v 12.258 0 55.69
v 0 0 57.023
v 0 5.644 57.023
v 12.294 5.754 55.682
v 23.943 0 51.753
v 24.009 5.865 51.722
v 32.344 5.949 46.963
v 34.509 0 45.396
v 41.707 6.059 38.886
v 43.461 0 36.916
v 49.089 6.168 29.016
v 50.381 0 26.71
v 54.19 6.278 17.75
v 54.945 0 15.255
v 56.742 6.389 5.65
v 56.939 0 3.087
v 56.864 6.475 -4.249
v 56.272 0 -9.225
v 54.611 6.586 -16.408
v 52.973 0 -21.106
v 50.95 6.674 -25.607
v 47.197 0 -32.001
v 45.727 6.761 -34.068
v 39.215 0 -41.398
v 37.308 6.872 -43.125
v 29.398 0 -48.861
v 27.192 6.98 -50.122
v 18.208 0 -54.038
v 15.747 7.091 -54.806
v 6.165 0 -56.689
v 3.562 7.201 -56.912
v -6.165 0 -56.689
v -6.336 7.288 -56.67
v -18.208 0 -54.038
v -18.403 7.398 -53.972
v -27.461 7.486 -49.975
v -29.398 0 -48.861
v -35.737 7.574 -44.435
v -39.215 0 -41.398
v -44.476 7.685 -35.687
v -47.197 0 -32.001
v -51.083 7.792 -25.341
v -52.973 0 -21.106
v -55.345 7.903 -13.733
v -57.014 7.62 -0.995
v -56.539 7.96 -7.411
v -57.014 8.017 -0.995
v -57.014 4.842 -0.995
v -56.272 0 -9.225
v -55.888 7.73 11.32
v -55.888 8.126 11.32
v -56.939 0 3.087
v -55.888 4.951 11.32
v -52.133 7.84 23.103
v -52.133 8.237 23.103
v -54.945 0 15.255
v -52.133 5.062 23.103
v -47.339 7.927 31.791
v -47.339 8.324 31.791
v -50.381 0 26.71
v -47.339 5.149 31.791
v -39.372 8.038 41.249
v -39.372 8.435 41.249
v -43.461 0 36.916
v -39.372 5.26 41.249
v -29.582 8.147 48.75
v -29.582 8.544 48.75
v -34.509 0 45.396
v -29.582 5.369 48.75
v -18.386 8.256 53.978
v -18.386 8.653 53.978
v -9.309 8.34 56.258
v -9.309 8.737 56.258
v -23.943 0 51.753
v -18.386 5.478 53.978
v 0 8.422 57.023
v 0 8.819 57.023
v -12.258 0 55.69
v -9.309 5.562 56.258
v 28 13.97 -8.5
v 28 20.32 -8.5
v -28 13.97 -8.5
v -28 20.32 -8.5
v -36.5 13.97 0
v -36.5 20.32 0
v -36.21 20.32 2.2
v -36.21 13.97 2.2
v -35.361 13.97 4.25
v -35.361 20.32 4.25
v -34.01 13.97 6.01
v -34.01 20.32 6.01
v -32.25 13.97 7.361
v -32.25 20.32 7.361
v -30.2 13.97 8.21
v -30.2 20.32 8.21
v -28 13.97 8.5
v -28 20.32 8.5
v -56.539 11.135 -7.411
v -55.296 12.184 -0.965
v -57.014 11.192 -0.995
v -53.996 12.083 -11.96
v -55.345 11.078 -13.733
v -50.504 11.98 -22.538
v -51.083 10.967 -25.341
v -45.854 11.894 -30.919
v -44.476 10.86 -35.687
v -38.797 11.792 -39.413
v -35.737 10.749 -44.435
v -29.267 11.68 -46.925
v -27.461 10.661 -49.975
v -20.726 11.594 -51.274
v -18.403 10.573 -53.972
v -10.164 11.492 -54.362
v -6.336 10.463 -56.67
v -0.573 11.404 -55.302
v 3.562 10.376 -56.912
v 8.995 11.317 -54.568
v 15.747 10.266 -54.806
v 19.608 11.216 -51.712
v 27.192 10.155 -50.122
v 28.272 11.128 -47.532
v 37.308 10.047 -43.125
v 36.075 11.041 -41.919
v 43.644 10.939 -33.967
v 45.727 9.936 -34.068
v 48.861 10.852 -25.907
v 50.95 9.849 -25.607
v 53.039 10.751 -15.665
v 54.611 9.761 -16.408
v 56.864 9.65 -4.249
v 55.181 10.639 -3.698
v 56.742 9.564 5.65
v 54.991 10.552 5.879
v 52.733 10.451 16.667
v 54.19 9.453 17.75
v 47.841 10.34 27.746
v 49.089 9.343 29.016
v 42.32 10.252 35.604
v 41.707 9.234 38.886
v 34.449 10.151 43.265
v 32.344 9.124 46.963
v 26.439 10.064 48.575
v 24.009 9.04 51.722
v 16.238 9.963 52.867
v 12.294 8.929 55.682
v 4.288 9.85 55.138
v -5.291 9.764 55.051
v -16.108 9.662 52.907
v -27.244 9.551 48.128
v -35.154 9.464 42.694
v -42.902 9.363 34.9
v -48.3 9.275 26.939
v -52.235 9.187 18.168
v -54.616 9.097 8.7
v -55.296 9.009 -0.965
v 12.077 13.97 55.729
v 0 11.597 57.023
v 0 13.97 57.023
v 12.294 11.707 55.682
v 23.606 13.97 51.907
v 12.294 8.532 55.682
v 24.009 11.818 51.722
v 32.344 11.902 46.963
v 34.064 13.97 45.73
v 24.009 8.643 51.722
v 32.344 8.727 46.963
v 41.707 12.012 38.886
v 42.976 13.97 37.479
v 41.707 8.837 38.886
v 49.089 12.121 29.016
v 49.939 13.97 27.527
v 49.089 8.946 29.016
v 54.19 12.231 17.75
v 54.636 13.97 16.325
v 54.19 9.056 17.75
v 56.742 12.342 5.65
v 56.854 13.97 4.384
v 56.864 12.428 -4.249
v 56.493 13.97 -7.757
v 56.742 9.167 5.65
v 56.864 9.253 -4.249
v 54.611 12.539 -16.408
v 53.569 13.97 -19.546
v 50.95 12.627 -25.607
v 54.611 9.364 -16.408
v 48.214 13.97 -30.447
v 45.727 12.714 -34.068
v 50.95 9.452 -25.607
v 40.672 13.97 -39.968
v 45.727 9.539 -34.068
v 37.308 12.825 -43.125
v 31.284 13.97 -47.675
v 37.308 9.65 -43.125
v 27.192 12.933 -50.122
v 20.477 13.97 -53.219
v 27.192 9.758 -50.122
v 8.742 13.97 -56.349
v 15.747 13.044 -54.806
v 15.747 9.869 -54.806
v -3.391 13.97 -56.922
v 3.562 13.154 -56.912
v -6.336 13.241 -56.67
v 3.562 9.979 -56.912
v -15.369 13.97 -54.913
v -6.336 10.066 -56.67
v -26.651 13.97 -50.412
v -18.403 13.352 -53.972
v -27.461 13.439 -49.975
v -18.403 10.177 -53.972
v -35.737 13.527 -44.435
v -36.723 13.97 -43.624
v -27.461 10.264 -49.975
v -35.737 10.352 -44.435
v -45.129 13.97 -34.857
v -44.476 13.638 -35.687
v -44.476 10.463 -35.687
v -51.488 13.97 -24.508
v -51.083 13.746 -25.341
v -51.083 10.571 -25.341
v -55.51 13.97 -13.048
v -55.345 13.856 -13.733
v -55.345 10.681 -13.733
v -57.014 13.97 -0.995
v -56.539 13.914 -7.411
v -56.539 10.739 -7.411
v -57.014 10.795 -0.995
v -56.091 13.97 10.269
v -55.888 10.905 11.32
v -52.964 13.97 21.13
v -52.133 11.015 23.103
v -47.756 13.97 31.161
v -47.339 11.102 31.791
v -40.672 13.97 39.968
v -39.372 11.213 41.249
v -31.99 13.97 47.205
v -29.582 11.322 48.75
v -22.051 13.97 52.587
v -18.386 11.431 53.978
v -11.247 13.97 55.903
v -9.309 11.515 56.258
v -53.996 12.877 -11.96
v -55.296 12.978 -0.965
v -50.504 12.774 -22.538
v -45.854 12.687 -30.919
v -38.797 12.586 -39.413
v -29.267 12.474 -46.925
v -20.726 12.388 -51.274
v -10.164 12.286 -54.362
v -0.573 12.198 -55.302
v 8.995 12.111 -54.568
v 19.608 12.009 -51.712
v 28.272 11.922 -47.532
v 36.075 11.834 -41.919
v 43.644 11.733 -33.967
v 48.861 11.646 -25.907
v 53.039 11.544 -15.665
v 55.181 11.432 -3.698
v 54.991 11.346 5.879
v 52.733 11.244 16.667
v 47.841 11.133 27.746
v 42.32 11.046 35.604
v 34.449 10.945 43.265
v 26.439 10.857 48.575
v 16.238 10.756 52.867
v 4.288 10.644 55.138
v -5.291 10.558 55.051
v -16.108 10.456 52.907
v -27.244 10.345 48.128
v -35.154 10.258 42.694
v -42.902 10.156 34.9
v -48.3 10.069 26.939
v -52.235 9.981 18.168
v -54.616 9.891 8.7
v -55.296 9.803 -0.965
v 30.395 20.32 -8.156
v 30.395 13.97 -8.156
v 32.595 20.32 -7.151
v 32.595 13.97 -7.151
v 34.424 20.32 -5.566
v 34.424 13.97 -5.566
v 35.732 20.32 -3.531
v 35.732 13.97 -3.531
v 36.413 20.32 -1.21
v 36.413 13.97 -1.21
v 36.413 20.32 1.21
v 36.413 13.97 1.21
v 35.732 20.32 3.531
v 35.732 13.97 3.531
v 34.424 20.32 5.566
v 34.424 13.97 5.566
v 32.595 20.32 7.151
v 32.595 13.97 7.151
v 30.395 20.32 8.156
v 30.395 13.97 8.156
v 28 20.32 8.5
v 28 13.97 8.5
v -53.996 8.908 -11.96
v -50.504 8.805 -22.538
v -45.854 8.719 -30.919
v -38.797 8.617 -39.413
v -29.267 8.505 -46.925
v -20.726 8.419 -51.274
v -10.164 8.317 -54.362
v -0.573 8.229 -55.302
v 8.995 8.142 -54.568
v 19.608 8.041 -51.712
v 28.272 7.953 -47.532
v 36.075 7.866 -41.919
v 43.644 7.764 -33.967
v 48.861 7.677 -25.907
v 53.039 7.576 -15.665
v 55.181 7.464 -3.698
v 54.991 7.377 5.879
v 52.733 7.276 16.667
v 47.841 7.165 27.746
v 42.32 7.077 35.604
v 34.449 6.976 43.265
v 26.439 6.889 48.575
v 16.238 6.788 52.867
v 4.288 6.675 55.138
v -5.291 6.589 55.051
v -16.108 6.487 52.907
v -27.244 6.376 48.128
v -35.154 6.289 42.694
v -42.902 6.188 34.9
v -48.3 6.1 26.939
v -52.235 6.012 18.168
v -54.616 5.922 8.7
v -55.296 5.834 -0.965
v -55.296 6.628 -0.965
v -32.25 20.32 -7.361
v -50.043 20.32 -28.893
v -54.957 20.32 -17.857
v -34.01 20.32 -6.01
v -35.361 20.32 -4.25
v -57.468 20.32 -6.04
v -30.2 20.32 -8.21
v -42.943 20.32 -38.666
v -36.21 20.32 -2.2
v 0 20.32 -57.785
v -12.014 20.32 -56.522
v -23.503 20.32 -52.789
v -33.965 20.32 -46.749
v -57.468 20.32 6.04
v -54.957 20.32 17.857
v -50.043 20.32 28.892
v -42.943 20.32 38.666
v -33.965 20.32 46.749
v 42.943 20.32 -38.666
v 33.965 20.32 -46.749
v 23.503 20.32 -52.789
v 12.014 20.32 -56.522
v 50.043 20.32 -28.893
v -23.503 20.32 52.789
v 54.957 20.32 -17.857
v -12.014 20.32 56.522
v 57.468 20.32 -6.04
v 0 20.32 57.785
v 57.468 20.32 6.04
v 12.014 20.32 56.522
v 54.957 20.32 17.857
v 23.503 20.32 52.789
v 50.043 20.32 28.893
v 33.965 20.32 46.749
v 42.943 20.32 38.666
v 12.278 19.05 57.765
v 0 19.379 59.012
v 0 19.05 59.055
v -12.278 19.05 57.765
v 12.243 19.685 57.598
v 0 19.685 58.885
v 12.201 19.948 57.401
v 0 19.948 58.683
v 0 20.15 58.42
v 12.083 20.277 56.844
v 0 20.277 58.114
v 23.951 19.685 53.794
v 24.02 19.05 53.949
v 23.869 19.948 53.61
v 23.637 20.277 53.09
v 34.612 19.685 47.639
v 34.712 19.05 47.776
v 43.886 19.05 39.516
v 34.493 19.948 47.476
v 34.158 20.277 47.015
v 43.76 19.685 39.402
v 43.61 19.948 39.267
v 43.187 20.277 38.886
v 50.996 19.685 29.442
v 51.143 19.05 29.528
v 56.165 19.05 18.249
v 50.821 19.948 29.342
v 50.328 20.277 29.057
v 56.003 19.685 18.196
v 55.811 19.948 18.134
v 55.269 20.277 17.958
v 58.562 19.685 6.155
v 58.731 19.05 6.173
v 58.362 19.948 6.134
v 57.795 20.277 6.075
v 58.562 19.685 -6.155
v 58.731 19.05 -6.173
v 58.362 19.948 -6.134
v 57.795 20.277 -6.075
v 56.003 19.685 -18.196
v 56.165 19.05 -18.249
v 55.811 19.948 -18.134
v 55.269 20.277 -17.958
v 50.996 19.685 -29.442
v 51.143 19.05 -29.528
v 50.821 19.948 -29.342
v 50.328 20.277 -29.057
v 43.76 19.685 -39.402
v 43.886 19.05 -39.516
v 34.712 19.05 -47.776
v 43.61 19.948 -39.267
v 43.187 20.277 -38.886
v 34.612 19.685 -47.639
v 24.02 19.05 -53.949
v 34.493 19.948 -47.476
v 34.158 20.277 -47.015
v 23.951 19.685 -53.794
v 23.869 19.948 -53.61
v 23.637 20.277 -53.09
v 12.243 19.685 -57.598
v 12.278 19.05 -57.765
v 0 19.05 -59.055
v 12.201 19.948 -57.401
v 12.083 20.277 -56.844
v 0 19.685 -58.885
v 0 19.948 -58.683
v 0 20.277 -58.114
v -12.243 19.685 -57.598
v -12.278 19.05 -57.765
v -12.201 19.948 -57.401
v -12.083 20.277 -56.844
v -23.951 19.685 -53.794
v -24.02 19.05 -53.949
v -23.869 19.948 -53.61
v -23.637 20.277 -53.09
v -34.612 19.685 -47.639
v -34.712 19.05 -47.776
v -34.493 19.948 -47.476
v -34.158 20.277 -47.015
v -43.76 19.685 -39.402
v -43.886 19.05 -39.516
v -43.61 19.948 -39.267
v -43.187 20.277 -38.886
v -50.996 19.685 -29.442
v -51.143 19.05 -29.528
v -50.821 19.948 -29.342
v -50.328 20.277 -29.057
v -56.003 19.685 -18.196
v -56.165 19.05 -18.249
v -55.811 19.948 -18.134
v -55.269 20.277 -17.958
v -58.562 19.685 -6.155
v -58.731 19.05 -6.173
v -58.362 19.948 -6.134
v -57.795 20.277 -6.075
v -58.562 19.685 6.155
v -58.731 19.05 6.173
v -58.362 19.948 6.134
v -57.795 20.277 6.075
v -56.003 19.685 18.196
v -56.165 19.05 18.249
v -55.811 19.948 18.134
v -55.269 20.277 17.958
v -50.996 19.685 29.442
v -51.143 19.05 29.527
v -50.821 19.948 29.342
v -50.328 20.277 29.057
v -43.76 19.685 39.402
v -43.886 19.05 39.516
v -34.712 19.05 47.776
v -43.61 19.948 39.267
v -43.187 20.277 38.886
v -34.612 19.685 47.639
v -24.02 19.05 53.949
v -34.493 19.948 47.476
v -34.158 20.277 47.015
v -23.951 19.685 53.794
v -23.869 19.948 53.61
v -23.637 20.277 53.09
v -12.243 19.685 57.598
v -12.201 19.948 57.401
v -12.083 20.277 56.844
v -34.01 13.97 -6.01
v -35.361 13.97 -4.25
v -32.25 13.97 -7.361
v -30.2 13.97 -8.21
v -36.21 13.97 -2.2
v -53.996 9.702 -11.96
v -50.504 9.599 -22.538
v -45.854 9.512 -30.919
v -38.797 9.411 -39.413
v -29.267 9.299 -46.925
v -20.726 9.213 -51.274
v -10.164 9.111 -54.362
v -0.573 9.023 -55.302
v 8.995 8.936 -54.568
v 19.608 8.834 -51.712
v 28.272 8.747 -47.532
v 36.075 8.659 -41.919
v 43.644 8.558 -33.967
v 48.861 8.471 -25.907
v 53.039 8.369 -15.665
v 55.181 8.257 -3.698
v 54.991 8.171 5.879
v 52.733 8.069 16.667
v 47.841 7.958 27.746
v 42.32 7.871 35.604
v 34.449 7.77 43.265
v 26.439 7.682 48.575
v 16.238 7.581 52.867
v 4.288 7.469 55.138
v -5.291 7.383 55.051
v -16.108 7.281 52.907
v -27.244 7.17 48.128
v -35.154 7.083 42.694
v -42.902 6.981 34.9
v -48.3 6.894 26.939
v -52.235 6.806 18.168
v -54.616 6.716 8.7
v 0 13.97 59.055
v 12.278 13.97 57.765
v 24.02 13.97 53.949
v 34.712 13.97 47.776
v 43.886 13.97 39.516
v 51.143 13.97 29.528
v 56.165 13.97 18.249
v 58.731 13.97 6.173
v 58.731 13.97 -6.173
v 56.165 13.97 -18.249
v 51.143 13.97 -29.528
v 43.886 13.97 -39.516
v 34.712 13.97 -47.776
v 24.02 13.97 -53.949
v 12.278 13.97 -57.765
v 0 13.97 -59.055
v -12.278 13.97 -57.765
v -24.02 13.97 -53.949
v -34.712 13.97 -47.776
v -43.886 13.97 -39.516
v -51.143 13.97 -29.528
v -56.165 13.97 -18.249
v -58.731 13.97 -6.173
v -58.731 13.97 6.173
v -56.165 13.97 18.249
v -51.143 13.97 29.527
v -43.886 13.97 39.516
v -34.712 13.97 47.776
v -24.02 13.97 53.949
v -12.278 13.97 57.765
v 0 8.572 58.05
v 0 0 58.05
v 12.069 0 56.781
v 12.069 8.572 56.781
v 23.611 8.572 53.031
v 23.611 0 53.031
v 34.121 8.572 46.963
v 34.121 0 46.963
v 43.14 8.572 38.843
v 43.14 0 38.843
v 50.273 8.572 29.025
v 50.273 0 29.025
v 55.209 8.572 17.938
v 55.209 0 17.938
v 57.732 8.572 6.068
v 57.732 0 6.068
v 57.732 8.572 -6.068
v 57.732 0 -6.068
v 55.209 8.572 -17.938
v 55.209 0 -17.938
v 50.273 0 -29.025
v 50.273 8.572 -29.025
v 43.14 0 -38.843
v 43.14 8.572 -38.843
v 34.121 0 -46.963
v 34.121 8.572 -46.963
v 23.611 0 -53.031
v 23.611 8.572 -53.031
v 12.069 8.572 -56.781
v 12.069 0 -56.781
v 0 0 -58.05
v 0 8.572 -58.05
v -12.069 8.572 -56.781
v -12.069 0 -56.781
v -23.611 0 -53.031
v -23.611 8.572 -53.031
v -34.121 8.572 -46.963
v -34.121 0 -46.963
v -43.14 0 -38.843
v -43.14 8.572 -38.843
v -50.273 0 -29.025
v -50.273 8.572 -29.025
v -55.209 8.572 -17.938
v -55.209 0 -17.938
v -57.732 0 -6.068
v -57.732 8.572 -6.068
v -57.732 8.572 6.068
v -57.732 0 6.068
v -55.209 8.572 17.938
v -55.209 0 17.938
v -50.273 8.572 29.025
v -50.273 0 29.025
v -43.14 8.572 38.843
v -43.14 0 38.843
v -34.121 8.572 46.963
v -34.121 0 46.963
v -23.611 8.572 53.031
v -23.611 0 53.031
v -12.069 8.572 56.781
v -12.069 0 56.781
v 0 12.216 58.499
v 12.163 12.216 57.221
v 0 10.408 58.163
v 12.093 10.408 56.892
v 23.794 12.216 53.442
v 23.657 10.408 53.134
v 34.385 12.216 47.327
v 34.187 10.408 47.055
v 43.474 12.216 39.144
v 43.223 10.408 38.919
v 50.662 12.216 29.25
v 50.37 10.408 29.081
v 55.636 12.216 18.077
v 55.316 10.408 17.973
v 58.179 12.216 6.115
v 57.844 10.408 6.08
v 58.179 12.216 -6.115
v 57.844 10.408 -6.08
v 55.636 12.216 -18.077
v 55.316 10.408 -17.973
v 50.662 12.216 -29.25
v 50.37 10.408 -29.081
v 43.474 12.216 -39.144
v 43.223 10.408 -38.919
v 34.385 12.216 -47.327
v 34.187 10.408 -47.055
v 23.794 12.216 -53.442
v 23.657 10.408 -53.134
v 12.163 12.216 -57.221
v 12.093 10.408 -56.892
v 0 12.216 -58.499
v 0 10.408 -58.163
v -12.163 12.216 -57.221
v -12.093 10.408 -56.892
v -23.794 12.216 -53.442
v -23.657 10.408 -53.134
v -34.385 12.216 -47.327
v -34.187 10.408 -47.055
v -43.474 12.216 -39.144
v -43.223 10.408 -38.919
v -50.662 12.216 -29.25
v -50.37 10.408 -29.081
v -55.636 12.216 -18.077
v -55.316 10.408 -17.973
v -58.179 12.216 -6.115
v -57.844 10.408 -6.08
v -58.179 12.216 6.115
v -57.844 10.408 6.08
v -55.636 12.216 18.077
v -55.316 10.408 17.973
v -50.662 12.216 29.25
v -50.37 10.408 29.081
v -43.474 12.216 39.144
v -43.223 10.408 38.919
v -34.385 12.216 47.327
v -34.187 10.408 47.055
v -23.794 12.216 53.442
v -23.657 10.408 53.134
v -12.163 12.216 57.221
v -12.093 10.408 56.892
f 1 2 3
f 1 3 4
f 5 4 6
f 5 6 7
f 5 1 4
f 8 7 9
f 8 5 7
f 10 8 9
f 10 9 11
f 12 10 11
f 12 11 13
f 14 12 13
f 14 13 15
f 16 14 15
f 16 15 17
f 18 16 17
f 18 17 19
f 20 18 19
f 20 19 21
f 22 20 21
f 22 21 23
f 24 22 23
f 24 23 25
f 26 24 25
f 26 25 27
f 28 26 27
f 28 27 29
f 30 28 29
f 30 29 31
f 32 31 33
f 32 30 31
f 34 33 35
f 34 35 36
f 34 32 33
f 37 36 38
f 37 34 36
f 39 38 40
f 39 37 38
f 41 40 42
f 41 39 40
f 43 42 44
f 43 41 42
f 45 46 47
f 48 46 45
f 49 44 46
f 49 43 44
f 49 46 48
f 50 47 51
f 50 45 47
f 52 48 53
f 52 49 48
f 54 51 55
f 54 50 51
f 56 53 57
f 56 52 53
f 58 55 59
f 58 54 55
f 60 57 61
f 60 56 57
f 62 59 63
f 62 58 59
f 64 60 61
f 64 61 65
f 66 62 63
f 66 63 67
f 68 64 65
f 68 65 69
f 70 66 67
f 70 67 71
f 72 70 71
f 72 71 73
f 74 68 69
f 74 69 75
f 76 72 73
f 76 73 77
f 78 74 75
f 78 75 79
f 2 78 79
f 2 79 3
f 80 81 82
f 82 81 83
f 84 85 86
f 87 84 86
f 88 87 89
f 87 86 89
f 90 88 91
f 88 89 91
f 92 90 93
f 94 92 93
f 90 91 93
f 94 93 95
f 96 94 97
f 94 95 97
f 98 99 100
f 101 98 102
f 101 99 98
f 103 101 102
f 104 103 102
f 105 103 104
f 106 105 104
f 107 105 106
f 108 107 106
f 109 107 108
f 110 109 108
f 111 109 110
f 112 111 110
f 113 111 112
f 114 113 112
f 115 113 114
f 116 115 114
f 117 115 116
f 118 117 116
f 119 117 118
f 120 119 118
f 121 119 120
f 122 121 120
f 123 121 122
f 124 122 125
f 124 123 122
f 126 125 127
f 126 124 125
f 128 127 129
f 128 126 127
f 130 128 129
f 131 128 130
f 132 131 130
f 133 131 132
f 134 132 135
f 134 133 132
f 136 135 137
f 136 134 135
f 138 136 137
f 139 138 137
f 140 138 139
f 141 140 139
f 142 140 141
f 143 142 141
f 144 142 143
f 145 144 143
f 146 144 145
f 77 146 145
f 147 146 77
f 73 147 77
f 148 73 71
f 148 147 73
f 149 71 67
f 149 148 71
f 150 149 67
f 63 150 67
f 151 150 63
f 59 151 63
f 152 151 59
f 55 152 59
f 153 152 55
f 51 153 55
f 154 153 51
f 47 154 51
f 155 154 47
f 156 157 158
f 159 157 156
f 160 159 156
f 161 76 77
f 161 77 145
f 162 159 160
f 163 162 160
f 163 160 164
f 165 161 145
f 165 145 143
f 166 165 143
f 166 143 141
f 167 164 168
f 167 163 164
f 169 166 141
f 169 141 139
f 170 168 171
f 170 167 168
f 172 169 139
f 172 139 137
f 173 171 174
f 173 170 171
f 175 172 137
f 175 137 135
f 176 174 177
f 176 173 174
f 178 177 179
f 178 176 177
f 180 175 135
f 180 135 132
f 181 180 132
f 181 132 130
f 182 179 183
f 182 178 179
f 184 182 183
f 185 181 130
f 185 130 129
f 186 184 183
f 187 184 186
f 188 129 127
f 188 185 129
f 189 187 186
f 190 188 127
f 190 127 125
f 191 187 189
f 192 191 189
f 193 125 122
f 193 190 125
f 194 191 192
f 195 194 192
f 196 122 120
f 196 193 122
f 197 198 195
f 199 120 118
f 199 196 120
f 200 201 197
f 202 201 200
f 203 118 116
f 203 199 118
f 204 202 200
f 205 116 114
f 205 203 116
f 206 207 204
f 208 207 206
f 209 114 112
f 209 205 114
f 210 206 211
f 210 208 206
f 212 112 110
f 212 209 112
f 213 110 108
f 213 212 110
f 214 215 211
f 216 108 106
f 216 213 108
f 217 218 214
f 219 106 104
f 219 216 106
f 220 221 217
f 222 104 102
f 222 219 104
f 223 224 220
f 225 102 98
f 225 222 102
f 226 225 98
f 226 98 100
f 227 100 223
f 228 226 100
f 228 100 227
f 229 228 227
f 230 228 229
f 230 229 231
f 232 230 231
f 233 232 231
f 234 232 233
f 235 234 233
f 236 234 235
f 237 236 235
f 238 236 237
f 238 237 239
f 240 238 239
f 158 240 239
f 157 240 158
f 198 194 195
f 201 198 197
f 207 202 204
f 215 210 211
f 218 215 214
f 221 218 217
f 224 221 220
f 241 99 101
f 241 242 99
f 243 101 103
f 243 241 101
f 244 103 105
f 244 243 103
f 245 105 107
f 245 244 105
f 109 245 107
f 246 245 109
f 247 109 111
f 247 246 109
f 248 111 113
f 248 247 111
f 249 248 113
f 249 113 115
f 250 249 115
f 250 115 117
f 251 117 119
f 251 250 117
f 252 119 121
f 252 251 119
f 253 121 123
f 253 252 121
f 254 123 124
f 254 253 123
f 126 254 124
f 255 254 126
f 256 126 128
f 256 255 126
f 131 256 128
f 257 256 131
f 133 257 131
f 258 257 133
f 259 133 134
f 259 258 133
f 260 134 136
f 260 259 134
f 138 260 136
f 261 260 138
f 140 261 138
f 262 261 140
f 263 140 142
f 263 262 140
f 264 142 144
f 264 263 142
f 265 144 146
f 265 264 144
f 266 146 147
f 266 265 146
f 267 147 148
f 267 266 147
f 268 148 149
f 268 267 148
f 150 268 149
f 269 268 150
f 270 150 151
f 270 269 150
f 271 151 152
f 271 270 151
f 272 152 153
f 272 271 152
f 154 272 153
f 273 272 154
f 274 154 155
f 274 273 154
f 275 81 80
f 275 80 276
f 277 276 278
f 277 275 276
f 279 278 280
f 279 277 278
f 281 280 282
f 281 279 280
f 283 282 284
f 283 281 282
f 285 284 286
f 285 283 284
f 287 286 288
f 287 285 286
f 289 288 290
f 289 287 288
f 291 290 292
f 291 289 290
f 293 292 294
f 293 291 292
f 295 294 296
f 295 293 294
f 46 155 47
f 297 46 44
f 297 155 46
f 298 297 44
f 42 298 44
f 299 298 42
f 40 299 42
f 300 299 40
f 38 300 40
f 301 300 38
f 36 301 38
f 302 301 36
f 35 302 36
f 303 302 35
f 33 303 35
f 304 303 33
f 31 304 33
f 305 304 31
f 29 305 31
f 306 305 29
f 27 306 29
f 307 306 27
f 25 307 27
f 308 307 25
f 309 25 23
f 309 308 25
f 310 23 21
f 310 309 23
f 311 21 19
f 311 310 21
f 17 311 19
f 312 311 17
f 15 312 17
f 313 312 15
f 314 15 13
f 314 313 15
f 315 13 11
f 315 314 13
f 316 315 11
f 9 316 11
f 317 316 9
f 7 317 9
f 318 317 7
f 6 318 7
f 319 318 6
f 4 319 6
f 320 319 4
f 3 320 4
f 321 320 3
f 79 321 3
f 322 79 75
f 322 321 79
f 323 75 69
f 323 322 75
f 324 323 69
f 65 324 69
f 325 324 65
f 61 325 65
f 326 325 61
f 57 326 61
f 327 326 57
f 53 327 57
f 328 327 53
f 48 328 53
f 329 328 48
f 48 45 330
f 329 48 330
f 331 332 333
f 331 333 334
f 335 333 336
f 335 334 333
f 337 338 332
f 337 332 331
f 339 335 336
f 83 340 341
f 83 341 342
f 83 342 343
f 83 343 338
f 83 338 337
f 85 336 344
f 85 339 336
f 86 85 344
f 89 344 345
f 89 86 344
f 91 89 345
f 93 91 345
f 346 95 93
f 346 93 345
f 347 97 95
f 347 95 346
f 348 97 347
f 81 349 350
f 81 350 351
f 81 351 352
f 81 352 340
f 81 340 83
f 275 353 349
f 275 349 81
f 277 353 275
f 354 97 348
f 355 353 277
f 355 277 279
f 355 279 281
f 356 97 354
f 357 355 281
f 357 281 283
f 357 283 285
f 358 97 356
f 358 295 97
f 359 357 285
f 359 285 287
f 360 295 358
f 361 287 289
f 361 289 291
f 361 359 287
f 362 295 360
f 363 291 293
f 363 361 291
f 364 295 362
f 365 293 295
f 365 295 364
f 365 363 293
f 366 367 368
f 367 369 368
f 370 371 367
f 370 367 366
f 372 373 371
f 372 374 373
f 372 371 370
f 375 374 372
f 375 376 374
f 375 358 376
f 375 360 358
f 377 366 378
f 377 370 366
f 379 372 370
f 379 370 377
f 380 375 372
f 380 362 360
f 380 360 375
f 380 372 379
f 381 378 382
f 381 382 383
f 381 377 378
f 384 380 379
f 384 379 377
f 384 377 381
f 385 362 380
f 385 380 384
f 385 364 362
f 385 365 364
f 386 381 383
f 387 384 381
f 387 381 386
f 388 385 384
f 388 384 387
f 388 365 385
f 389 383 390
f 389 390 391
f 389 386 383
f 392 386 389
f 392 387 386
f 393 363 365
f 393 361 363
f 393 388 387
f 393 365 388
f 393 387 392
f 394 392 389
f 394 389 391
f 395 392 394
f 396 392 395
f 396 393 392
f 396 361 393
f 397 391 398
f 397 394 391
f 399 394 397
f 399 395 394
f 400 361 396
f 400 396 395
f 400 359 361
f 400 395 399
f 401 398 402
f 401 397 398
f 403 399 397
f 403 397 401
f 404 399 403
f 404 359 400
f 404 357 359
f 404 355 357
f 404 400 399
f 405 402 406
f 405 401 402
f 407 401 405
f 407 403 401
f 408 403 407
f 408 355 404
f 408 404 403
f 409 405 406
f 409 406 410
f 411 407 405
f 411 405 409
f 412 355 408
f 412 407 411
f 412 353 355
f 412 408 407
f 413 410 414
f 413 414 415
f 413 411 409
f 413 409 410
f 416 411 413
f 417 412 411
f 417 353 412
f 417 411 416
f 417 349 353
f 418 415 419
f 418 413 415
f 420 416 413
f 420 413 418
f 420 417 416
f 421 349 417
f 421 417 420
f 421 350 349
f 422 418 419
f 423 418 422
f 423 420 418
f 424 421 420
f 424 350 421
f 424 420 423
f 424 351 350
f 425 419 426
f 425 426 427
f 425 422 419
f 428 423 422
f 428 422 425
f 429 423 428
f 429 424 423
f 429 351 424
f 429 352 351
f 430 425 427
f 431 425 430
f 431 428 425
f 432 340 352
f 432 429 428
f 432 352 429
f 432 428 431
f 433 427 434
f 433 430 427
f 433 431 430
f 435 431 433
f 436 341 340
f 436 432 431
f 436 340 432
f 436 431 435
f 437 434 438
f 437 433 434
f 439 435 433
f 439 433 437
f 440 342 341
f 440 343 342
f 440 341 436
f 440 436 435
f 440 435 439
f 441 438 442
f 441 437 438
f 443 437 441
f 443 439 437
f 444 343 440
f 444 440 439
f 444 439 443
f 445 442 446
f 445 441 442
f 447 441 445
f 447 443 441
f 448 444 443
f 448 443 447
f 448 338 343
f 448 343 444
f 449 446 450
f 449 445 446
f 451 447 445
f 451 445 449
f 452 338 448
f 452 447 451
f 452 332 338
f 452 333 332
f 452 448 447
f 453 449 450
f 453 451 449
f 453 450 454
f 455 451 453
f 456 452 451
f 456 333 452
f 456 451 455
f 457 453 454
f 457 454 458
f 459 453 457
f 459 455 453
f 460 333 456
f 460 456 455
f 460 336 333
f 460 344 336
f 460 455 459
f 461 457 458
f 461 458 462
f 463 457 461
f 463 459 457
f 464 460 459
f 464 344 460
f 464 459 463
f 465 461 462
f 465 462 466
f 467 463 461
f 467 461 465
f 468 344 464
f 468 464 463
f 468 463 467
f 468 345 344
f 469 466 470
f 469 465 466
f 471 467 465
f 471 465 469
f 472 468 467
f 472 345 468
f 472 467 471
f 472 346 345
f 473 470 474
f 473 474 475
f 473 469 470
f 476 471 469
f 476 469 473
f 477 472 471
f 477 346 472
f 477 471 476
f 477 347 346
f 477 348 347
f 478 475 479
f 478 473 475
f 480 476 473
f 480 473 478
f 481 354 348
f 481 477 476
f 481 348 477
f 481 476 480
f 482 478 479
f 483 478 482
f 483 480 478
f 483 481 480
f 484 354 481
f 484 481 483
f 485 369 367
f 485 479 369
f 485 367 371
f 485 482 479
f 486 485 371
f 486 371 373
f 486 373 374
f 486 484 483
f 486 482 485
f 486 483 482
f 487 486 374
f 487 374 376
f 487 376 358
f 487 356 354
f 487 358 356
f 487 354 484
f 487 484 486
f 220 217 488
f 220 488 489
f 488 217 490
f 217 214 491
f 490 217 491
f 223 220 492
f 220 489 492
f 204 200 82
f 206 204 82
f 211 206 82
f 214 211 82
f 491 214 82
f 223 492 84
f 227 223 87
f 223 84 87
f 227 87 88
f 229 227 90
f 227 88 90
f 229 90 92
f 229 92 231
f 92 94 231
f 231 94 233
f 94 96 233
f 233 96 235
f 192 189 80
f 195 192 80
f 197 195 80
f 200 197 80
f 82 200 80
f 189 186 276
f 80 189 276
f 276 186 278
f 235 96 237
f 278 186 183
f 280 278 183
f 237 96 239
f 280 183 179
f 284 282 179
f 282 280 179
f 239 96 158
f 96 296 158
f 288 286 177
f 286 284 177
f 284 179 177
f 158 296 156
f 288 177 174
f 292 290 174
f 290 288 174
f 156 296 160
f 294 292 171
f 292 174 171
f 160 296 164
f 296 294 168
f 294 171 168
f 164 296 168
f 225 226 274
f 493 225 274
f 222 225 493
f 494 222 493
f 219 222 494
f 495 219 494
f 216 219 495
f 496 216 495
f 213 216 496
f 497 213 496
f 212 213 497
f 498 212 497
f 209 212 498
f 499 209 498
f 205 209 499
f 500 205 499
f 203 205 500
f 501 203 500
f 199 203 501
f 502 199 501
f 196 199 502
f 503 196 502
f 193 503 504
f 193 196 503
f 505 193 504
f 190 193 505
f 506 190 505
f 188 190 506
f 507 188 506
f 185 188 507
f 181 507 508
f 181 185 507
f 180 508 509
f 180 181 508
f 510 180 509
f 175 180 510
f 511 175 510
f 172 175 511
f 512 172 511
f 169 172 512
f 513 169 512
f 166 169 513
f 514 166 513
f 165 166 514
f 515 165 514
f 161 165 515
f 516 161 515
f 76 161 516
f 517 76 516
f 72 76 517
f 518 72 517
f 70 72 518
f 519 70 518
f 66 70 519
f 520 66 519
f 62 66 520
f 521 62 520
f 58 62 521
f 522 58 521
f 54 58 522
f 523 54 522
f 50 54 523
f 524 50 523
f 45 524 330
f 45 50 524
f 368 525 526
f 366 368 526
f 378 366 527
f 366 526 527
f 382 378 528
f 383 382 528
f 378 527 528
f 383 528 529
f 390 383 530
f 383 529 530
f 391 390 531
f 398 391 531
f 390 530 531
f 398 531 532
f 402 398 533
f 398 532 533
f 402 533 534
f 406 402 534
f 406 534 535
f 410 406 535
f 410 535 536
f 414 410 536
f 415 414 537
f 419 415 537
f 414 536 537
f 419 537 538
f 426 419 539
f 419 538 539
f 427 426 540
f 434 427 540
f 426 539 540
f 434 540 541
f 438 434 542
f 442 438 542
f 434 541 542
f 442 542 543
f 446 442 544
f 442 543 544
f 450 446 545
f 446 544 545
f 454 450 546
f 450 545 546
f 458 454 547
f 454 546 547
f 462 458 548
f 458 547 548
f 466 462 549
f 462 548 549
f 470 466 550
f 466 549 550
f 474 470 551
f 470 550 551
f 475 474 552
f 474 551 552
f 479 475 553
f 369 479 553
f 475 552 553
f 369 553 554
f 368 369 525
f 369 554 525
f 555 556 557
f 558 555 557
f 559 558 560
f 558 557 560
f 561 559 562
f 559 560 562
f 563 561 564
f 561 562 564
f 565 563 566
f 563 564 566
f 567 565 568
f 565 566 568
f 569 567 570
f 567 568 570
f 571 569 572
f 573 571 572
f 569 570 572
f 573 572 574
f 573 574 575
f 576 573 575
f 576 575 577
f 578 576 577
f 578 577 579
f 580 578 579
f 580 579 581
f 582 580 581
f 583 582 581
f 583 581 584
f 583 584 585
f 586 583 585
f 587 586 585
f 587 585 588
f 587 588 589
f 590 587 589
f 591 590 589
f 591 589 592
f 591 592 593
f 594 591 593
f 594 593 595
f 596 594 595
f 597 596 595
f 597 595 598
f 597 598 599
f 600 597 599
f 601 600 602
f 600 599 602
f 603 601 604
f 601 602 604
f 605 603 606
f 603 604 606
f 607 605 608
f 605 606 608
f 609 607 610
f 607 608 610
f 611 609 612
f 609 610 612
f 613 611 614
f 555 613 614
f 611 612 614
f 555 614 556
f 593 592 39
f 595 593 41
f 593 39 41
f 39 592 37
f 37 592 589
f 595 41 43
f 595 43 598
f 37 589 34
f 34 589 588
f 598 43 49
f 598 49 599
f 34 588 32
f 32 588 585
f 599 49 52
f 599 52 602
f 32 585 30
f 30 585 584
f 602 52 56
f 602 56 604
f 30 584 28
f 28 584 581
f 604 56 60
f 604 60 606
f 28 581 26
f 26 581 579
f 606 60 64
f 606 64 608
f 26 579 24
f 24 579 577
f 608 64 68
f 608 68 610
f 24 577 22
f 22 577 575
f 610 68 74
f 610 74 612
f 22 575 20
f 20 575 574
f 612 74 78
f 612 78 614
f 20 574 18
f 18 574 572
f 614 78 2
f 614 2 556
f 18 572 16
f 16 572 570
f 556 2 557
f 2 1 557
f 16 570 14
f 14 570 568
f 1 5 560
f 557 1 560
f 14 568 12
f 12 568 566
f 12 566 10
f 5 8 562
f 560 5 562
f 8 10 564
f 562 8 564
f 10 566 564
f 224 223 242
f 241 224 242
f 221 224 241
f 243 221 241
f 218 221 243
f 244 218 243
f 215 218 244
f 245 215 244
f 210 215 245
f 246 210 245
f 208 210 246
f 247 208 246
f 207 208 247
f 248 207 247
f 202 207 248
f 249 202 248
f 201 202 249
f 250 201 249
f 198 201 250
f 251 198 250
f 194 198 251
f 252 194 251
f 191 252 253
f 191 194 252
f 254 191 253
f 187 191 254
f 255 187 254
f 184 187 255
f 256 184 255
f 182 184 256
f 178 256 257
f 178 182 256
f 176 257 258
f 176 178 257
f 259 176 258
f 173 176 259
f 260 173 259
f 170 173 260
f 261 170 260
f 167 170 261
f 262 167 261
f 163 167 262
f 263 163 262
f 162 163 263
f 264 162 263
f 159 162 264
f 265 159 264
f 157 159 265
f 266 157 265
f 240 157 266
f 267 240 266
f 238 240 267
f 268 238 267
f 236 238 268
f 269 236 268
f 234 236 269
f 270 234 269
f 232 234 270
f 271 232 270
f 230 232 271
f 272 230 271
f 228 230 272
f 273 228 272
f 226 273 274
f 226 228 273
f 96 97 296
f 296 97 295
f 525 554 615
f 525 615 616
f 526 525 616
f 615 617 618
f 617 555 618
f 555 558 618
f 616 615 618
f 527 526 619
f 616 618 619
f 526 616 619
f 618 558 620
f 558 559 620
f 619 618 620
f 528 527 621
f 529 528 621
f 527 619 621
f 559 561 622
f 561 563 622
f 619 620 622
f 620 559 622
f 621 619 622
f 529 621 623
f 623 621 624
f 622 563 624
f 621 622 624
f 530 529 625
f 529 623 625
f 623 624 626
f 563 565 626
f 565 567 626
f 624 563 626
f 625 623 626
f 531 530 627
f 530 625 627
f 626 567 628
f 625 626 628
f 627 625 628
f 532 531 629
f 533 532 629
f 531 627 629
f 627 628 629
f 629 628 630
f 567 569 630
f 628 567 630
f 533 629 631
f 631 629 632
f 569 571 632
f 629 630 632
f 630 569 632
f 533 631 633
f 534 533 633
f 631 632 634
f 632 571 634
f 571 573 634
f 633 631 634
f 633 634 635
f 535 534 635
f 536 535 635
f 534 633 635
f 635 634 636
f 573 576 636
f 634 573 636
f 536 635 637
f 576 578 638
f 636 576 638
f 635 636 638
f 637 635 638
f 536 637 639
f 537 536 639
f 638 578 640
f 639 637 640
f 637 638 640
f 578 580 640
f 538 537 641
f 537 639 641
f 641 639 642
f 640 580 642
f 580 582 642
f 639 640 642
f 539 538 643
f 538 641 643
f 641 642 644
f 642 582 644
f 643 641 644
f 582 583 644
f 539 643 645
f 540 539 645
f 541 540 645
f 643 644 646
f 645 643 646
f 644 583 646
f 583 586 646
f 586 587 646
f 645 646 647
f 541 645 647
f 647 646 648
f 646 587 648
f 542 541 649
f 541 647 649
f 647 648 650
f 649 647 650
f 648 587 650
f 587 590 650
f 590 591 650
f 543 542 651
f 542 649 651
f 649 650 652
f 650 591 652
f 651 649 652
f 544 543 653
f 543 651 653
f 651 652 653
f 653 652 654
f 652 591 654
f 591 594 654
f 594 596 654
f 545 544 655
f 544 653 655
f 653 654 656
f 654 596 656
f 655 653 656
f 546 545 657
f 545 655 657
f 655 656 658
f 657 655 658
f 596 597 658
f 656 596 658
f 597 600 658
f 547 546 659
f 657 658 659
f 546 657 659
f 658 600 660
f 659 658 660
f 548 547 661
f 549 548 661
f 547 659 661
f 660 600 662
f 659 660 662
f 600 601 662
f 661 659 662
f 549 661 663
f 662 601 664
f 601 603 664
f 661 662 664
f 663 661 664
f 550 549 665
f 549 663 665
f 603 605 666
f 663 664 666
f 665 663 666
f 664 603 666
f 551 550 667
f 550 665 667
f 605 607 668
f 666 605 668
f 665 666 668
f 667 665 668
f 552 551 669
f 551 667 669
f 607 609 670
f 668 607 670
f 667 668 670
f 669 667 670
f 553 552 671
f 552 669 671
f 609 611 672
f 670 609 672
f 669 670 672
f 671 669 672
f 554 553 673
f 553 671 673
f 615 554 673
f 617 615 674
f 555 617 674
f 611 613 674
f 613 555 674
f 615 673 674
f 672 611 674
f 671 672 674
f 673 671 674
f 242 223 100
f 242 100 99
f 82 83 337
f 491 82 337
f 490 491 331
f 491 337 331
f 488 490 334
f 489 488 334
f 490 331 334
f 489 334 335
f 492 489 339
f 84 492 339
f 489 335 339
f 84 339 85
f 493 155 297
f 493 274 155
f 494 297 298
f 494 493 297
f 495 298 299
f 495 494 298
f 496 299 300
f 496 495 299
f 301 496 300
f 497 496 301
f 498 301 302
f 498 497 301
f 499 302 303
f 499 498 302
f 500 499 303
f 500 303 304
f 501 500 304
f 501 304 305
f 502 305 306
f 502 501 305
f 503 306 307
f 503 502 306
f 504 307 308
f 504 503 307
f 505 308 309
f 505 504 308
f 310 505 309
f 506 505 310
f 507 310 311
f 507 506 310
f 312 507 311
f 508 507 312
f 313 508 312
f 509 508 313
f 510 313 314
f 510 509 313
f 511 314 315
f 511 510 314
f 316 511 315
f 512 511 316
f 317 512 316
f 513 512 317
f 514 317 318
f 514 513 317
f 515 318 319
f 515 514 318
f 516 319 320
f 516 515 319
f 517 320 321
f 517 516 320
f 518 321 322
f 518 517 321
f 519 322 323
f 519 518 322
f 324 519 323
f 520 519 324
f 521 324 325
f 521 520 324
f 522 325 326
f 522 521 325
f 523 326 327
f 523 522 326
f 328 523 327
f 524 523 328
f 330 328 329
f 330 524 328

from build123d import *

# Parameters (mm, degrees)
SKETCH1_R           = 58.05
SKETCH1_R_2         = 57.023
BOSS_EXTRUDE1_DEPTH = 13.97
SKETCH2_R           = 59.055
BOSS_EXTRUDE2_DEPTH = 6.35
THREAD1_PITCH       = 3.175
FILLET1_R           = 1.27
FILLET2_R           = 15
SKETCH3_W           = 28
SKETCH3_H           = 8.5
CUT_EXTRUDE1_DEPTH  = 10


with BuildPart() as part:
    # Sketch1 → Boss-Extrude1 (new body)
    with BuildSketch(Plane(origin=(0, 0, 0), x_dir=(1, 0, 0), z_dir=(0, 1, 0))):
        with Locations(Location((0, 0, 0), (0, 0, 270))):
            Circle(SKETCH1_R)
        with Locations(Location((0, 0, 0), (0, 0, 270))):
            Circle(SKETCH1_R_2, mode=Mode.SUBTRACT)
    extrude(amount=BOSS_EXTRUDE1_DEPTH)

    # Sketch2 → Boss-Extrude2 (add)
    with BuildSketch(Plane(origin=(0, 13.97, 0), x_dir=(1, 0, 0), z_dir=(0, 1, 0))):
        with Locations(Location((0, 0, 0), (0, 0, 270))):
            Circle(SKETCH2_R)
    extrude(amount=BOSS_EXTRUDE2_DEPTH)

    # Thread1: arcs per turn and ends read off the stored shape
    # Thread1: the profile of Thread Profile3 profile screwed along a right-hand helix through 2 turns, 12 arcs to a turn; built about Z, then put on its axis
    thread1_z = Axis((0, 0, 0), (0, 0, 1))
    thread1_corners = [(57.0233, 2.5e-08, -0.000173205), (57.0233, 2.5e-08, 2.778298196), (55.304480847, 2.4e-08, 1.785937496), (55.304480847, 2.4e-08, 0.992187496)]
    with BuildLine(mode=Mode.PRIVATE) as thread1_profile:
        Line(thread1_corners[0], thread1_corners[1])
        Line(thread1_corners[1], thread1_corners[2])
        Line(thread1_corners[2], thread1_corners[3])
        Line(thread1_corners[3], thread1_corners[0])
    thread1_cap = Face(thread1_profile.wire())
    thread1_turn_angles = [0, 15, 30, 45, 60, 75, 90, 105, 120, 135, 150, 165, 180, 195, 210, 225, 240, 255, 270, 285, 300, 315, 330, 345, 360]
    thread1_turn_weights = [1, 0.9659258262890683, 1, 0.9659258262890683, 1, 0.9659258262890683, 1, 0.9659258262890683, 1, 0.9659258262890683, 1, 0.9659258262890683, 1, 0.9659258262890683, 1, 0.9659258262890683, 1, 0.9659258262890683, 1, 0.9659258262890683, 1, 0.9659258262890683, 1, 0.9659258262890683, 1]
    thread1_turn_rails = [Edge.make_bspline([Vector(p[0], p[1], 0).rotate(thread1_z, thread1_turn_angles[k]) / thread1_turn_weights[k] + Vector(0, 0, p[2] + THREAD1_PITCH * thread1_turn_angles[k] / 360) for k in range(25)], [0, 0, 0, 1, 1, 2, 2, 3, 3, 4, 4, 5, 5, 6, 6, 7, 7, 8, 8, 9, 9, 10, 10, 11, 11, 12, 12, 12], 2, thread1_turn_weights) for p in thread1_corners]
    thread1_turn_sides = [Face.make_surface_from_curves(thread1_turn_rails[p[0]], thread1_turn_rails[p[1]]) for p in [(0, 1), (1, 2), (2, 3), (3, 0)]]
    thread1 = Plane(origin=(0, 13.97, 0), x_dir=(-0.999847695, 0, -0.017452406), z_dir=(0, -1, 0)) * Solid(Shell([*[p.moved(Location((0, 0, THREAD1_PITCH * i))) for i in range(2) for p in thread1_turn_sides], thread1_cap, thread1_cap.rotate(thread1_z, 720).moved(Location((0, 0, THREAD1_PITCH * 720 / 360)))]))
    add(thread1)

    # Fillet1
    fillet1_edges = [part.edges().sort_by_distance(p)[0] for p in [
        (0, 20.32, -59.055),
    ]]
    fillet(fillet1_edges, radius=FILLET1_R)

    # Fillet2
    # the kernel refuses this fillet: 15 mm, written as the material it adds along each edge
    with BuildSketch(Plane(origin=(0, 13.97, 0), x_dir=(0, 0, 1), z_dir=(-1, 0, 0))) as fillet2_piece_1:
        with BuildLine():
            CenterArc((73.05, -5.398145515), FILLET2_R, 158.907396465, 21.092603535)
            Line((58.05, -5.398145515), (57.75, -5.398145515))
            Line((57.75, -5.398145515), (57.75, 0))
            Line((57.75, 0), (58.05, 0.3))
            ThreePointArc((58.05, 0.3), (58.5525, 0.3), (58.7751, 0.10796291))
            Line((58.7751, 0.10796291), (59.055, 0))
        make_face()
    revolve(axis=Axis((0, 13.97, 0), (0, 1, 0)))

    # Sketch3 → Cut-Extrude1 (cut)
    with BuildSketch(Plane(origin=(0, 20.32, 0), x_dir=(1, 0, 0), z_dir=(0, 1, 0))):
        with BuildLine():
            Line((-28, -8.5), (-28, 0))
            Line((-28, 0), (-36.5, 0))
            ThreePointArc((-36.5, 0), (-34.01040764, -6.01040764), (-28, -8.5))
        make_face()
        with BuildLine():
            Line((-36.5, 0), (-28, 0))
            Line((-28, 0), (-28, 8.5))
            ThreePointArc((-28, 8.5), (-34.01040764, 6.01040764), (-36.5, 0))
        make_face()
        with Locations((-14, 4.25)):
            Rectangle(SKETCH3_W, SKETCH3_H)
        Polygon((0, 8.5), (0, 0), (-28, 0), (-28, -8.5), (28, -8.5), (28, 8.5), align=None)
        with BuildLine():
            ThreePointArc((28, 8.5), (36.5, 0), (28, -8.5))
            Line((28, -8.5), (28, 8.5))
        make_face()
    extrude(amount=-CUT_EXTRUDE1_DEPTH, mode=Mode.SUBTRACT)


solid = part.part
